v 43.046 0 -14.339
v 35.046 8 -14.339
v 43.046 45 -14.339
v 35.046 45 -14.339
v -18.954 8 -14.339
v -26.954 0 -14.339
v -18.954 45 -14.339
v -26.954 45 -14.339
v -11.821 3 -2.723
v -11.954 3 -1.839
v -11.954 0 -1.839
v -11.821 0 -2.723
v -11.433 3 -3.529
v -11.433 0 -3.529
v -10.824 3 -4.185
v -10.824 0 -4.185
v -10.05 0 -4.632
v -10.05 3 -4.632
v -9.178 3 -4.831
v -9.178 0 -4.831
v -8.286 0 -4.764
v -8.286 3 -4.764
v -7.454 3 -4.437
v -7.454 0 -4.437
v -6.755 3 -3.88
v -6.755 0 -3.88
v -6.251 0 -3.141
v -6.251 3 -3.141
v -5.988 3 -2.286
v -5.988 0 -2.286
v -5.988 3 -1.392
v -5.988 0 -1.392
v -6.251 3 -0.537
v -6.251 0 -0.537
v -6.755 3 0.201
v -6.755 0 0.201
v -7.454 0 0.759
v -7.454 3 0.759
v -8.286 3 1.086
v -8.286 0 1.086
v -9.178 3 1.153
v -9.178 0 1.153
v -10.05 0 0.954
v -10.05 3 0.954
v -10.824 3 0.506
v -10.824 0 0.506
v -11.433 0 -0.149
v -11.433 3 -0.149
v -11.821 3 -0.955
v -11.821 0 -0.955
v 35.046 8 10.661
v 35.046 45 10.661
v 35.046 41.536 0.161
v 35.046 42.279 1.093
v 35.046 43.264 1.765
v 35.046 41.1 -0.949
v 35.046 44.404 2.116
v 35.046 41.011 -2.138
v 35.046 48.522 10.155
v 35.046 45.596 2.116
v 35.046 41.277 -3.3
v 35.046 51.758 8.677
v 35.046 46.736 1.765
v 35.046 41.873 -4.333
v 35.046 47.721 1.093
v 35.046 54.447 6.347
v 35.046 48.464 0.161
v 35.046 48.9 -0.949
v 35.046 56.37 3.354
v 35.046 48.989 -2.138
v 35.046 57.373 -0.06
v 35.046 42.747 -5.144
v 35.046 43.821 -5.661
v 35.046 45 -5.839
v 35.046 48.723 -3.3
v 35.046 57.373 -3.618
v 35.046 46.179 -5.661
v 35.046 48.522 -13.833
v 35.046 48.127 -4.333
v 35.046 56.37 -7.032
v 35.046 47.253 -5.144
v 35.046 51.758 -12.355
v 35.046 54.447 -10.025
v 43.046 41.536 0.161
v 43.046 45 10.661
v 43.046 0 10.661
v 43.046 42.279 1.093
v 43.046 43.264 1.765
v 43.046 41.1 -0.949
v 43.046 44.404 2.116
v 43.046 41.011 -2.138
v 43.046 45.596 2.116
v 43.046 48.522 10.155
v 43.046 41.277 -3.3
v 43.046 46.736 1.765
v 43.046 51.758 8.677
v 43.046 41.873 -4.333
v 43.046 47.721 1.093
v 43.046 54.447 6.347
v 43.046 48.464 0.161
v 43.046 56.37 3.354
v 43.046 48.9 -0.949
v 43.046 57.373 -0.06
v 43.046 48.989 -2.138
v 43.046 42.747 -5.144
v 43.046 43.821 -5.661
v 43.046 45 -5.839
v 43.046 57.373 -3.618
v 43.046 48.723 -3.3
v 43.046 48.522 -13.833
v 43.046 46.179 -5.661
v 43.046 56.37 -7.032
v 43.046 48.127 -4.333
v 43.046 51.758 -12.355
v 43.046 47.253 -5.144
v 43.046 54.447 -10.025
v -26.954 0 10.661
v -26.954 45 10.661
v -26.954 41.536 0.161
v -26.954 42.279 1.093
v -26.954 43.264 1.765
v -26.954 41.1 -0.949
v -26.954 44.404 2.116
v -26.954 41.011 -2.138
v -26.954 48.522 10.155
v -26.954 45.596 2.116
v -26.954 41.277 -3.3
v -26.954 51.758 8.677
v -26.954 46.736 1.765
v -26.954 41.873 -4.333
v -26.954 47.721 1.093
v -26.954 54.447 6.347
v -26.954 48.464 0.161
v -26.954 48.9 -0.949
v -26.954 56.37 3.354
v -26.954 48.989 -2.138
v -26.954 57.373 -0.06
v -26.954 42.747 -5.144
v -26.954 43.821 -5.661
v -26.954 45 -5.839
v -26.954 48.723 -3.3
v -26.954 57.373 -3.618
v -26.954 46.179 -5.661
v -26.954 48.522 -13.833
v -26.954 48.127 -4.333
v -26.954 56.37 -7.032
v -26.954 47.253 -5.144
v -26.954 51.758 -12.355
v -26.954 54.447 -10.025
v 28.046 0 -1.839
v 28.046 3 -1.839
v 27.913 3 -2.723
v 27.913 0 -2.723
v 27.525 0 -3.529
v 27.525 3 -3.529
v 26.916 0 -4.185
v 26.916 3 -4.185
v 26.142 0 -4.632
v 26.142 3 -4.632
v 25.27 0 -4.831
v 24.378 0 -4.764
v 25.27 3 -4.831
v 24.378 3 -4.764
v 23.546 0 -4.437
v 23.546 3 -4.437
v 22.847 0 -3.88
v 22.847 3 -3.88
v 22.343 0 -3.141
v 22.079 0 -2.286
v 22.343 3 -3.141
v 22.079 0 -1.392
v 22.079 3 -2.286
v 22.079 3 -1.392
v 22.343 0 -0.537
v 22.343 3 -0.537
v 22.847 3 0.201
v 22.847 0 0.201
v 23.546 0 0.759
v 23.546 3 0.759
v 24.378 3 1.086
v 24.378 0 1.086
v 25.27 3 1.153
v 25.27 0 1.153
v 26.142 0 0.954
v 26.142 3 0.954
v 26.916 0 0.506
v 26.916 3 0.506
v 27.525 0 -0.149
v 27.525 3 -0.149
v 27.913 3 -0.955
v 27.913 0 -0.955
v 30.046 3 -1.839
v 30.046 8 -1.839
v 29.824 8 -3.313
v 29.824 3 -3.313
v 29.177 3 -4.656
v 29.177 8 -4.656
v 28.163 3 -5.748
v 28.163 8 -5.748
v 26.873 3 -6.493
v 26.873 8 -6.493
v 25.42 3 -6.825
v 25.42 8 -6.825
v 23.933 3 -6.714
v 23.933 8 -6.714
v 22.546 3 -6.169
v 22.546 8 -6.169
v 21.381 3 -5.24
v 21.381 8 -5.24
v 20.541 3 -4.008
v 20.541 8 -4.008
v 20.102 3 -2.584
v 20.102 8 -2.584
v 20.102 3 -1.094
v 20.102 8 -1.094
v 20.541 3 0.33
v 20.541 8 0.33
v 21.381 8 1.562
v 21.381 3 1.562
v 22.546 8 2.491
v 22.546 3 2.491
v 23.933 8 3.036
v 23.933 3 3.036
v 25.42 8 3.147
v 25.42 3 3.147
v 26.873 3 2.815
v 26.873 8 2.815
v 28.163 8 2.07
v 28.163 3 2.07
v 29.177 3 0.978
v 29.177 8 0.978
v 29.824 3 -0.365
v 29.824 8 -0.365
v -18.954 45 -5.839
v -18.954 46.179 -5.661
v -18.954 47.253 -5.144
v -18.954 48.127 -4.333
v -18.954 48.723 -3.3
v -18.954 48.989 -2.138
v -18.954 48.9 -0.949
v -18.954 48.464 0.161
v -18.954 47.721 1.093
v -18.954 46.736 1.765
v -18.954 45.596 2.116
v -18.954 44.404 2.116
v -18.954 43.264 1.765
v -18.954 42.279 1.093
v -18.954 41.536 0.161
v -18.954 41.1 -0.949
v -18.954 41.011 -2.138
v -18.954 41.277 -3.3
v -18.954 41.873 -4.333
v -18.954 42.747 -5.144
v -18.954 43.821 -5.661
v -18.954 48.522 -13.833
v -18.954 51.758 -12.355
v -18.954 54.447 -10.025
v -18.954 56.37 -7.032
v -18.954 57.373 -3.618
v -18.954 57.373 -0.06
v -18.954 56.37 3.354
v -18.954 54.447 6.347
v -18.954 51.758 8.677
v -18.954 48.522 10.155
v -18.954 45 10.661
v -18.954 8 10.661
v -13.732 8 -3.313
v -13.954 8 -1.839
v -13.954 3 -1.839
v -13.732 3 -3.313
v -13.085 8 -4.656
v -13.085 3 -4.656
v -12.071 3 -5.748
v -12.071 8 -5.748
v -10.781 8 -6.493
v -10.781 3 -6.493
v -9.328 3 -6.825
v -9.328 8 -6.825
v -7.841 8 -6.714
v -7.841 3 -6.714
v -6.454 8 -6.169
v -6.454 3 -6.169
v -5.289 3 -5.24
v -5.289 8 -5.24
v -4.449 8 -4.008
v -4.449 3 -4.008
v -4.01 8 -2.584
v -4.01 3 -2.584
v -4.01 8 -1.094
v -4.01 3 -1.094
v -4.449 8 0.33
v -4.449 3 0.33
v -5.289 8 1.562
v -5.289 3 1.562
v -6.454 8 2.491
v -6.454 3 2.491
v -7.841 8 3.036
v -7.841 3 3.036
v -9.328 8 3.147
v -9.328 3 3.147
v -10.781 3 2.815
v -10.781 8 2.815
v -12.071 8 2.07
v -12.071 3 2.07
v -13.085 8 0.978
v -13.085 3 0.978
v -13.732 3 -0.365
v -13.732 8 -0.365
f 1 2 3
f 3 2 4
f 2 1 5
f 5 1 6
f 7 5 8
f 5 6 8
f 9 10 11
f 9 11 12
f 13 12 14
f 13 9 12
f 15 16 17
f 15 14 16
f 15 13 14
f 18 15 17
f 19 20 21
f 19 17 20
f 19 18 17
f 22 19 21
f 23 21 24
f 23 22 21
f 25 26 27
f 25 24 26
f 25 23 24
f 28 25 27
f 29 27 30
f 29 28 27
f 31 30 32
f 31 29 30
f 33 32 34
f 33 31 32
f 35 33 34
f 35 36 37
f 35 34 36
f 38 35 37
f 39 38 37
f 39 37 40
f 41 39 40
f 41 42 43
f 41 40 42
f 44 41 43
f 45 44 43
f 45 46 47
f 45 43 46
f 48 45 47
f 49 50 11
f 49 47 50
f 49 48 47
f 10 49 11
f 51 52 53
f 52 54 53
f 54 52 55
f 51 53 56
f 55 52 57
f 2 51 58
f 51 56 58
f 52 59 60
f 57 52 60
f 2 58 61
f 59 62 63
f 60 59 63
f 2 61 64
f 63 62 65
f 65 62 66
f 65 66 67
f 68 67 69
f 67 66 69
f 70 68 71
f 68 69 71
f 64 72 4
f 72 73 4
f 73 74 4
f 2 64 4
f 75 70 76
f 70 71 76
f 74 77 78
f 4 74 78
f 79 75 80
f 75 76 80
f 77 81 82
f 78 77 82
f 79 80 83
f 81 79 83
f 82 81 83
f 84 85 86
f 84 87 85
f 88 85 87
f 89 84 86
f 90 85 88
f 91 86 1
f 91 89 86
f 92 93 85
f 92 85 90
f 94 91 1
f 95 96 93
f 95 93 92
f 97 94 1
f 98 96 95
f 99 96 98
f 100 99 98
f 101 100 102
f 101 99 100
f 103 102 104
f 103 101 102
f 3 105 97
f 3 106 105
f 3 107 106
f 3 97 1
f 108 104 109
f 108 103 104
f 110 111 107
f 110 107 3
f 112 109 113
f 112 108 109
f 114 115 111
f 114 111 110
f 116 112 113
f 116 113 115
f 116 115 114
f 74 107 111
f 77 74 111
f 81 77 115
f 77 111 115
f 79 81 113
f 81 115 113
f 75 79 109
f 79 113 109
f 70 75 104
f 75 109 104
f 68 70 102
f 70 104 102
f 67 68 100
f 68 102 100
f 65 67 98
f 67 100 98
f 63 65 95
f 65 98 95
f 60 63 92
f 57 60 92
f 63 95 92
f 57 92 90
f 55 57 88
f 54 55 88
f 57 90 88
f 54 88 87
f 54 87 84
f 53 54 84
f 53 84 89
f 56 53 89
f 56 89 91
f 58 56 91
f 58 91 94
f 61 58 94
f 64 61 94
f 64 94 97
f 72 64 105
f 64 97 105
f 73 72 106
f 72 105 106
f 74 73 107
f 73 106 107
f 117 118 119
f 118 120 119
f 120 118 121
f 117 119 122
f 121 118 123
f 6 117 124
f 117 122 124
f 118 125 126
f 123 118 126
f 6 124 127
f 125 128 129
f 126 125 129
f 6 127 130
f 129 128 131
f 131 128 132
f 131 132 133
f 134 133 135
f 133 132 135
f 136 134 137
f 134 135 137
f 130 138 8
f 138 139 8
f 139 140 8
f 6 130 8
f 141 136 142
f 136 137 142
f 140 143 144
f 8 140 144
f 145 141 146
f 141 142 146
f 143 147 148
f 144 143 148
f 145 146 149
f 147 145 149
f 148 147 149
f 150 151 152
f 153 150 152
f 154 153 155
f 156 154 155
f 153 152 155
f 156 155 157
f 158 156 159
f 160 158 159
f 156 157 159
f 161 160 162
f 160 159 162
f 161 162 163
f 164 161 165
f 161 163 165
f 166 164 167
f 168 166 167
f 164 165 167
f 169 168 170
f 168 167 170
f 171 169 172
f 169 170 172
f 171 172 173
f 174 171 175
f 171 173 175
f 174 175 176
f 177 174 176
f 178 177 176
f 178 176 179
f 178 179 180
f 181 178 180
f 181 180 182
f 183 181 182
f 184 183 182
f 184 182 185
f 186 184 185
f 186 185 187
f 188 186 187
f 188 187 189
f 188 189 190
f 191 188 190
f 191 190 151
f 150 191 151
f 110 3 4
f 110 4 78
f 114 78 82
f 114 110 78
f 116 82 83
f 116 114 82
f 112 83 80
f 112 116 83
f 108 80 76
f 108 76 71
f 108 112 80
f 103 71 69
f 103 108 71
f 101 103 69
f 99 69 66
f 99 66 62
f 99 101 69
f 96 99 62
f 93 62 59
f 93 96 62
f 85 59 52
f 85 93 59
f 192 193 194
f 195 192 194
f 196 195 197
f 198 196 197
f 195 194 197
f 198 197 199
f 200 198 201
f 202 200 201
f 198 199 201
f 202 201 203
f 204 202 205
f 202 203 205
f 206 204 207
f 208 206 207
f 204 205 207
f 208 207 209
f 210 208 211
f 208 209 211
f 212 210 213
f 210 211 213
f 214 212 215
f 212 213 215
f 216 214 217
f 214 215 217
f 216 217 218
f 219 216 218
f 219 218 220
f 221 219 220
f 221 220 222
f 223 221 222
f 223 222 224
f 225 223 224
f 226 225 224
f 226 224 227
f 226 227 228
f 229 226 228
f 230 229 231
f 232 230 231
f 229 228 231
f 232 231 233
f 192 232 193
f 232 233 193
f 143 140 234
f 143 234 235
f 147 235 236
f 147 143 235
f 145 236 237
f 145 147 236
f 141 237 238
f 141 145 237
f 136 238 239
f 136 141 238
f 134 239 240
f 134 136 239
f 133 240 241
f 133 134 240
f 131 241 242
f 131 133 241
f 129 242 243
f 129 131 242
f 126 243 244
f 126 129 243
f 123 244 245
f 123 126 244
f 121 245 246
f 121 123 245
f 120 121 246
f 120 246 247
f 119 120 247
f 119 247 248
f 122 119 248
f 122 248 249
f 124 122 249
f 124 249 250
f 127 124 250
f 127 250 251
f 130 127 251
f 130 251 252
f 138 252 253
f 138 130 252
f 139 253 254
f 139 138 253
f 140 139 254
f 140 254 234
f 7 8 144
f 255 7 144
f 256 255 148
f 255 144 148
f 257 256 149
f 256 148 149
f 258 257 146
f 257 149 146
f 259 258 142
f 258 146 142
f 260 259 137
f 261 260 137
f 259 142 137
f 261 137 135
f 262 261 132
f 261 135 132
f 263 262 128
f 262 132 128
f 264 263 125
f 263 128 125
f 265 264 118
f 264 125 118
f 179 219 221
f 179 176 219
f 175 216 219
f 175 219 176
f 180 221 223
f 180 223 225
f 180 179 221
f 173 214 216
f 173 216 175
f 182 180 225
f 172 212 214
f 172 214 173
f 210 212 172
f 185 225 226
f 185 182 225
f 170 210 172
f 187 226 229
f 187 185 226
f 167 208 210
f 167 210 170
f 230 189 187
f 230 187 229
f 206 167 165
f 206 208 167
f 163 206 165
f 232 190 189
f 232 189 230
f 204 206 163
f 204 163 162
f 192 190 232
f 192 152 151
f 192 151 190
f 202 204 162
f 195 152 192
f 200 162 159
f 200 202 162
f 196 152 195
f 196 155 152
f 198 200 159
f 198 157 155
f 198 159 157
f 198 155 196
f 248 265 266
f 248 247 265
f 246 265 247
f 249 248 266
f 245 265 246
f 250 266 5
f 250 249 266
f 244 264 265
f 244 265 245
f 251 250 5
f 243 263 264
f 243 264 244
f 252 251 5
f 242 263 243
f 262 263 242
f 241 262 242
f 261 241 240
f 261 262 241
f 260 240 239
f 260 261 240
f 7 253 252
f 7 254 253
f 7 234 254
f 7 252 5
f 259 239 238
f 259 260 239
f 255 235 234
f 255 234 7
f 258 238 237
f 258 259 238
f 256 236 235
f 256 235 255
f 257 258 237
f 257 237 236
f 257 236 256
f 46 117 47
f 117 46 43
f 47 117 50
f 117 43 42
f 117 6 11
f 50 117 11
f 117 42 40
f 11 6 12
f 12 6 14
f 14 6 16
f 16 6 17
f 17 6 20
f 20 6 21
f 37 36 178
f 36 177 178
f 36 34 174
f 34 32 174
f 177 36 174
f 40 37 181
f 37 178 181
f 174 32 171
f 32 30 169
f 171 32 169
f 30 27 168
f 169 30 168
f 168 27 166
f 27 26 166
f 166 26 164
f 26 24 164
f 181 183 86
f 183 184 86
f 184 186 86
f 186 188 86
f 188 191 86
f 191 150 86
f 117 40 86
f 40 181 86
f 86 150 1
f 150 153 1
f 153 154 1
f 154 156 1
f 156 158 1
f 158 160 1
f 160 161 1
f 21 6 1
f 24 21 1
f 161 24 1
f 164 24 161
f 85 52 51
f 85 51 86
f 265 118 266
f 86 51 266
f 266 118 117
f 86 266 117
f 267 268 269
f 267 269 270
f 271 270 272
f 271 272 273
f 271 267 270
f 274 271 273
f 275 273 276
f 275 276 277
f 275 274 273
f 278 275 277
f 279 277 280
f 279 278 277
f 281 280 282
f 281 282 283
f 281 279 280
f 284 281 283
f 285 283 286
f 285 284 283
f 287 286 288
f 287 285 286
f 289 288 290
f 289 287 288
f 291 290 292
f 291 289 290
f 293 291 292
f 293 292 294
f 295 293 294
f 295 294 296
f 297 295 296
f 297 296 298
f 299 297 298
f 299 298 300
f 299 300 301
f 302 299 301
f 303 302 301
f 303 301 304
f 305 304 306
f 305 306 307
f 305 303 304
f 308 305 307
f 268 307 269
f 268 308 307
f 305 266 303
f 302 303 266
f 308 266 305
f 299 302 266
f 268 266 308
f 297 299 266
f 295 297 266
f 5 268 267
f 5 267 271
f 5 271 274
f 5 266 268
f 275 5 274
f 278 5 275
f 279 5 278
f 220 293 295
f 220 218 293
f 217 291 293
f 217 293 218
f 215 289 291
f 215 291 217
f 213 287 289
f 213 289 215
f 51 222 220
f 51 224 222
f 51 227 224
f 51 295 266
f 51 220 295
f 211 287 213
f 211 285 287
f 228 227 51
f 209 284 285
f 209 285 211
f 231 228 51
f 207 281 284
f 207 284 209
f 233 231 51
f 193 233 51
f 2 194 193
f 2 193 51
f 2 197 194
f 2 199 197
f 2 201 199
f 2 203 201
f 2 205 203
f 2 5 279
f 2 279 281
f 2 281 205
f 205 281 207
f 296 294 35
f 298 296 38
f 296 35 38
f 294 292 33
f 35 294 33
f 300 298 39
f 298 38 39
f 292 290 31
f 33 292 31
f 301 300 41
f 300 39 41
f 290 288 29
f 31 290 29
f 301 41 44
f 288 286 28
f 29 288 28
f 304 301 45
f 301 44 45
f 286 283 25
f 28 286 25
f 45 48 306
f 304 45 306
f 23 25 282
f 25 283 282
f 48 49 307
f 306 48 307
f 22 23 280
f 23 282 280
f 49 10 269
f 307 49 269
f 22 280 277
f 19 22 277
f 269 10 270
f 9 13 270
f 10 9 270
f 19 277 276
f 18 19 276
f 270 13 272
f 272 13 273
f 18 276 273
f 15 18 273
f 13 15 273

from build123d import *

# Parameters (mm, degrees)
SKETCH1_W           = 70
SKETCH1_H           = 25
BOSS_EXTRUDE1_DEPTH = 8
SKETCH2_R           = 3
CUT_EXTRUDE1_DEPTH  = 9
SKETCH2_3_R         = 5
CUT_EXTRUDE2_DEPTH  = 5
SKETCH3_R           = 4
BOSS_EXTRUDE2_DEPTH = 8


with BuildPart() as part:
    # Sketch1 → Boss-Extrude1 (new body)
    with BuildSketch(Plane(origin=(0, 0, 0), x_dir=(1, 0, 0), z_dir=(0, 1, 0))):
        with Locations((8.045977011, 1.83908046)):
            Rectangle(SKETCH1_W, SKETCH1_H)
    extrude(amount=BOSS_EXTRUDE1_DEPTH)

    # Sketch2 → Cut-Extrude1 (cut, through all)
    with BuildSketch(Plane(origin=(0, 8, 0), x_dir=(1, 0, 0), z_dir=(0, 1, 0))):
        with Locations((25.045977011, 1.83908046)):
            Circle(SKETCH2_R)
    cut_extrude1 = extrude(amount=-CUT_EXTRUDE1_DEPTH, mode=Mode.SUBTRACT)

    # Sketch2<3> → Cut-Extrude2 (cut)
    with BuildSketch(Plane(origin=(0, 8, 0), x_dir=(1, 0, 0), z_dir=(0, 1, 0))):
        with Locations((25.045977011, 1.83908046)):
            Circle(SKETCH2_3_R)
    cut_extrude2 = extrude(amount=-CUT_EXTRUDE2_DEPTH, mode=Mode.SUBTRACT)

    # Sketch3 → Boss-Extrude2 (add)
    with BuildSketch(Plane(origin=(43.045977011, 0, 0), x_dir=(0, 0, -1), z_dir=(1, 0, 0))):
        with BuildLine():
            Line((-10.66091954, 45), (-10.66091954, 8))
            Line((-10.66091954, 8), (14.33908046, 8))
            Line((14.33908046, 8), (14.33908046, 45))
            ThreePointArc((14.33908046, 45), (1.83908046, 57.5), (-10.66091954, 45))
        make_face()
        with Locations((1.83908046, 45)):
            Circle(SKETCH3_R, mode=Mode.SUBTRACT)
    boss_extrude2 = extrude(amount=-BOSS_EXTRUDE2_DEPTH)

    # Mirror1: Cut-Extrude1, Cut-Extrude2, Boss-Extrude2 across plane
    add(cut_extrude1.mirror(Plane(origin=(8.045977011, 0, 0), x_dir=(0, 0, 1), z_dir=(1, 0, 0))), mode=Mode.SUBTRACT)
    add(cut_extrude2.mirror(Plane(origin=(8.045977011, 0, 0), x_dir=(0, 0, 1), z_dir=(1, 0, 0))), mode=Mode.SUBTRACT)
    add(boss_extrude2.mirror(Plane(origin=(8.045977011, 0, 0), x_dir=(0, 0, 1), z_dir=(1, 0, 0))))


solid = part.part
